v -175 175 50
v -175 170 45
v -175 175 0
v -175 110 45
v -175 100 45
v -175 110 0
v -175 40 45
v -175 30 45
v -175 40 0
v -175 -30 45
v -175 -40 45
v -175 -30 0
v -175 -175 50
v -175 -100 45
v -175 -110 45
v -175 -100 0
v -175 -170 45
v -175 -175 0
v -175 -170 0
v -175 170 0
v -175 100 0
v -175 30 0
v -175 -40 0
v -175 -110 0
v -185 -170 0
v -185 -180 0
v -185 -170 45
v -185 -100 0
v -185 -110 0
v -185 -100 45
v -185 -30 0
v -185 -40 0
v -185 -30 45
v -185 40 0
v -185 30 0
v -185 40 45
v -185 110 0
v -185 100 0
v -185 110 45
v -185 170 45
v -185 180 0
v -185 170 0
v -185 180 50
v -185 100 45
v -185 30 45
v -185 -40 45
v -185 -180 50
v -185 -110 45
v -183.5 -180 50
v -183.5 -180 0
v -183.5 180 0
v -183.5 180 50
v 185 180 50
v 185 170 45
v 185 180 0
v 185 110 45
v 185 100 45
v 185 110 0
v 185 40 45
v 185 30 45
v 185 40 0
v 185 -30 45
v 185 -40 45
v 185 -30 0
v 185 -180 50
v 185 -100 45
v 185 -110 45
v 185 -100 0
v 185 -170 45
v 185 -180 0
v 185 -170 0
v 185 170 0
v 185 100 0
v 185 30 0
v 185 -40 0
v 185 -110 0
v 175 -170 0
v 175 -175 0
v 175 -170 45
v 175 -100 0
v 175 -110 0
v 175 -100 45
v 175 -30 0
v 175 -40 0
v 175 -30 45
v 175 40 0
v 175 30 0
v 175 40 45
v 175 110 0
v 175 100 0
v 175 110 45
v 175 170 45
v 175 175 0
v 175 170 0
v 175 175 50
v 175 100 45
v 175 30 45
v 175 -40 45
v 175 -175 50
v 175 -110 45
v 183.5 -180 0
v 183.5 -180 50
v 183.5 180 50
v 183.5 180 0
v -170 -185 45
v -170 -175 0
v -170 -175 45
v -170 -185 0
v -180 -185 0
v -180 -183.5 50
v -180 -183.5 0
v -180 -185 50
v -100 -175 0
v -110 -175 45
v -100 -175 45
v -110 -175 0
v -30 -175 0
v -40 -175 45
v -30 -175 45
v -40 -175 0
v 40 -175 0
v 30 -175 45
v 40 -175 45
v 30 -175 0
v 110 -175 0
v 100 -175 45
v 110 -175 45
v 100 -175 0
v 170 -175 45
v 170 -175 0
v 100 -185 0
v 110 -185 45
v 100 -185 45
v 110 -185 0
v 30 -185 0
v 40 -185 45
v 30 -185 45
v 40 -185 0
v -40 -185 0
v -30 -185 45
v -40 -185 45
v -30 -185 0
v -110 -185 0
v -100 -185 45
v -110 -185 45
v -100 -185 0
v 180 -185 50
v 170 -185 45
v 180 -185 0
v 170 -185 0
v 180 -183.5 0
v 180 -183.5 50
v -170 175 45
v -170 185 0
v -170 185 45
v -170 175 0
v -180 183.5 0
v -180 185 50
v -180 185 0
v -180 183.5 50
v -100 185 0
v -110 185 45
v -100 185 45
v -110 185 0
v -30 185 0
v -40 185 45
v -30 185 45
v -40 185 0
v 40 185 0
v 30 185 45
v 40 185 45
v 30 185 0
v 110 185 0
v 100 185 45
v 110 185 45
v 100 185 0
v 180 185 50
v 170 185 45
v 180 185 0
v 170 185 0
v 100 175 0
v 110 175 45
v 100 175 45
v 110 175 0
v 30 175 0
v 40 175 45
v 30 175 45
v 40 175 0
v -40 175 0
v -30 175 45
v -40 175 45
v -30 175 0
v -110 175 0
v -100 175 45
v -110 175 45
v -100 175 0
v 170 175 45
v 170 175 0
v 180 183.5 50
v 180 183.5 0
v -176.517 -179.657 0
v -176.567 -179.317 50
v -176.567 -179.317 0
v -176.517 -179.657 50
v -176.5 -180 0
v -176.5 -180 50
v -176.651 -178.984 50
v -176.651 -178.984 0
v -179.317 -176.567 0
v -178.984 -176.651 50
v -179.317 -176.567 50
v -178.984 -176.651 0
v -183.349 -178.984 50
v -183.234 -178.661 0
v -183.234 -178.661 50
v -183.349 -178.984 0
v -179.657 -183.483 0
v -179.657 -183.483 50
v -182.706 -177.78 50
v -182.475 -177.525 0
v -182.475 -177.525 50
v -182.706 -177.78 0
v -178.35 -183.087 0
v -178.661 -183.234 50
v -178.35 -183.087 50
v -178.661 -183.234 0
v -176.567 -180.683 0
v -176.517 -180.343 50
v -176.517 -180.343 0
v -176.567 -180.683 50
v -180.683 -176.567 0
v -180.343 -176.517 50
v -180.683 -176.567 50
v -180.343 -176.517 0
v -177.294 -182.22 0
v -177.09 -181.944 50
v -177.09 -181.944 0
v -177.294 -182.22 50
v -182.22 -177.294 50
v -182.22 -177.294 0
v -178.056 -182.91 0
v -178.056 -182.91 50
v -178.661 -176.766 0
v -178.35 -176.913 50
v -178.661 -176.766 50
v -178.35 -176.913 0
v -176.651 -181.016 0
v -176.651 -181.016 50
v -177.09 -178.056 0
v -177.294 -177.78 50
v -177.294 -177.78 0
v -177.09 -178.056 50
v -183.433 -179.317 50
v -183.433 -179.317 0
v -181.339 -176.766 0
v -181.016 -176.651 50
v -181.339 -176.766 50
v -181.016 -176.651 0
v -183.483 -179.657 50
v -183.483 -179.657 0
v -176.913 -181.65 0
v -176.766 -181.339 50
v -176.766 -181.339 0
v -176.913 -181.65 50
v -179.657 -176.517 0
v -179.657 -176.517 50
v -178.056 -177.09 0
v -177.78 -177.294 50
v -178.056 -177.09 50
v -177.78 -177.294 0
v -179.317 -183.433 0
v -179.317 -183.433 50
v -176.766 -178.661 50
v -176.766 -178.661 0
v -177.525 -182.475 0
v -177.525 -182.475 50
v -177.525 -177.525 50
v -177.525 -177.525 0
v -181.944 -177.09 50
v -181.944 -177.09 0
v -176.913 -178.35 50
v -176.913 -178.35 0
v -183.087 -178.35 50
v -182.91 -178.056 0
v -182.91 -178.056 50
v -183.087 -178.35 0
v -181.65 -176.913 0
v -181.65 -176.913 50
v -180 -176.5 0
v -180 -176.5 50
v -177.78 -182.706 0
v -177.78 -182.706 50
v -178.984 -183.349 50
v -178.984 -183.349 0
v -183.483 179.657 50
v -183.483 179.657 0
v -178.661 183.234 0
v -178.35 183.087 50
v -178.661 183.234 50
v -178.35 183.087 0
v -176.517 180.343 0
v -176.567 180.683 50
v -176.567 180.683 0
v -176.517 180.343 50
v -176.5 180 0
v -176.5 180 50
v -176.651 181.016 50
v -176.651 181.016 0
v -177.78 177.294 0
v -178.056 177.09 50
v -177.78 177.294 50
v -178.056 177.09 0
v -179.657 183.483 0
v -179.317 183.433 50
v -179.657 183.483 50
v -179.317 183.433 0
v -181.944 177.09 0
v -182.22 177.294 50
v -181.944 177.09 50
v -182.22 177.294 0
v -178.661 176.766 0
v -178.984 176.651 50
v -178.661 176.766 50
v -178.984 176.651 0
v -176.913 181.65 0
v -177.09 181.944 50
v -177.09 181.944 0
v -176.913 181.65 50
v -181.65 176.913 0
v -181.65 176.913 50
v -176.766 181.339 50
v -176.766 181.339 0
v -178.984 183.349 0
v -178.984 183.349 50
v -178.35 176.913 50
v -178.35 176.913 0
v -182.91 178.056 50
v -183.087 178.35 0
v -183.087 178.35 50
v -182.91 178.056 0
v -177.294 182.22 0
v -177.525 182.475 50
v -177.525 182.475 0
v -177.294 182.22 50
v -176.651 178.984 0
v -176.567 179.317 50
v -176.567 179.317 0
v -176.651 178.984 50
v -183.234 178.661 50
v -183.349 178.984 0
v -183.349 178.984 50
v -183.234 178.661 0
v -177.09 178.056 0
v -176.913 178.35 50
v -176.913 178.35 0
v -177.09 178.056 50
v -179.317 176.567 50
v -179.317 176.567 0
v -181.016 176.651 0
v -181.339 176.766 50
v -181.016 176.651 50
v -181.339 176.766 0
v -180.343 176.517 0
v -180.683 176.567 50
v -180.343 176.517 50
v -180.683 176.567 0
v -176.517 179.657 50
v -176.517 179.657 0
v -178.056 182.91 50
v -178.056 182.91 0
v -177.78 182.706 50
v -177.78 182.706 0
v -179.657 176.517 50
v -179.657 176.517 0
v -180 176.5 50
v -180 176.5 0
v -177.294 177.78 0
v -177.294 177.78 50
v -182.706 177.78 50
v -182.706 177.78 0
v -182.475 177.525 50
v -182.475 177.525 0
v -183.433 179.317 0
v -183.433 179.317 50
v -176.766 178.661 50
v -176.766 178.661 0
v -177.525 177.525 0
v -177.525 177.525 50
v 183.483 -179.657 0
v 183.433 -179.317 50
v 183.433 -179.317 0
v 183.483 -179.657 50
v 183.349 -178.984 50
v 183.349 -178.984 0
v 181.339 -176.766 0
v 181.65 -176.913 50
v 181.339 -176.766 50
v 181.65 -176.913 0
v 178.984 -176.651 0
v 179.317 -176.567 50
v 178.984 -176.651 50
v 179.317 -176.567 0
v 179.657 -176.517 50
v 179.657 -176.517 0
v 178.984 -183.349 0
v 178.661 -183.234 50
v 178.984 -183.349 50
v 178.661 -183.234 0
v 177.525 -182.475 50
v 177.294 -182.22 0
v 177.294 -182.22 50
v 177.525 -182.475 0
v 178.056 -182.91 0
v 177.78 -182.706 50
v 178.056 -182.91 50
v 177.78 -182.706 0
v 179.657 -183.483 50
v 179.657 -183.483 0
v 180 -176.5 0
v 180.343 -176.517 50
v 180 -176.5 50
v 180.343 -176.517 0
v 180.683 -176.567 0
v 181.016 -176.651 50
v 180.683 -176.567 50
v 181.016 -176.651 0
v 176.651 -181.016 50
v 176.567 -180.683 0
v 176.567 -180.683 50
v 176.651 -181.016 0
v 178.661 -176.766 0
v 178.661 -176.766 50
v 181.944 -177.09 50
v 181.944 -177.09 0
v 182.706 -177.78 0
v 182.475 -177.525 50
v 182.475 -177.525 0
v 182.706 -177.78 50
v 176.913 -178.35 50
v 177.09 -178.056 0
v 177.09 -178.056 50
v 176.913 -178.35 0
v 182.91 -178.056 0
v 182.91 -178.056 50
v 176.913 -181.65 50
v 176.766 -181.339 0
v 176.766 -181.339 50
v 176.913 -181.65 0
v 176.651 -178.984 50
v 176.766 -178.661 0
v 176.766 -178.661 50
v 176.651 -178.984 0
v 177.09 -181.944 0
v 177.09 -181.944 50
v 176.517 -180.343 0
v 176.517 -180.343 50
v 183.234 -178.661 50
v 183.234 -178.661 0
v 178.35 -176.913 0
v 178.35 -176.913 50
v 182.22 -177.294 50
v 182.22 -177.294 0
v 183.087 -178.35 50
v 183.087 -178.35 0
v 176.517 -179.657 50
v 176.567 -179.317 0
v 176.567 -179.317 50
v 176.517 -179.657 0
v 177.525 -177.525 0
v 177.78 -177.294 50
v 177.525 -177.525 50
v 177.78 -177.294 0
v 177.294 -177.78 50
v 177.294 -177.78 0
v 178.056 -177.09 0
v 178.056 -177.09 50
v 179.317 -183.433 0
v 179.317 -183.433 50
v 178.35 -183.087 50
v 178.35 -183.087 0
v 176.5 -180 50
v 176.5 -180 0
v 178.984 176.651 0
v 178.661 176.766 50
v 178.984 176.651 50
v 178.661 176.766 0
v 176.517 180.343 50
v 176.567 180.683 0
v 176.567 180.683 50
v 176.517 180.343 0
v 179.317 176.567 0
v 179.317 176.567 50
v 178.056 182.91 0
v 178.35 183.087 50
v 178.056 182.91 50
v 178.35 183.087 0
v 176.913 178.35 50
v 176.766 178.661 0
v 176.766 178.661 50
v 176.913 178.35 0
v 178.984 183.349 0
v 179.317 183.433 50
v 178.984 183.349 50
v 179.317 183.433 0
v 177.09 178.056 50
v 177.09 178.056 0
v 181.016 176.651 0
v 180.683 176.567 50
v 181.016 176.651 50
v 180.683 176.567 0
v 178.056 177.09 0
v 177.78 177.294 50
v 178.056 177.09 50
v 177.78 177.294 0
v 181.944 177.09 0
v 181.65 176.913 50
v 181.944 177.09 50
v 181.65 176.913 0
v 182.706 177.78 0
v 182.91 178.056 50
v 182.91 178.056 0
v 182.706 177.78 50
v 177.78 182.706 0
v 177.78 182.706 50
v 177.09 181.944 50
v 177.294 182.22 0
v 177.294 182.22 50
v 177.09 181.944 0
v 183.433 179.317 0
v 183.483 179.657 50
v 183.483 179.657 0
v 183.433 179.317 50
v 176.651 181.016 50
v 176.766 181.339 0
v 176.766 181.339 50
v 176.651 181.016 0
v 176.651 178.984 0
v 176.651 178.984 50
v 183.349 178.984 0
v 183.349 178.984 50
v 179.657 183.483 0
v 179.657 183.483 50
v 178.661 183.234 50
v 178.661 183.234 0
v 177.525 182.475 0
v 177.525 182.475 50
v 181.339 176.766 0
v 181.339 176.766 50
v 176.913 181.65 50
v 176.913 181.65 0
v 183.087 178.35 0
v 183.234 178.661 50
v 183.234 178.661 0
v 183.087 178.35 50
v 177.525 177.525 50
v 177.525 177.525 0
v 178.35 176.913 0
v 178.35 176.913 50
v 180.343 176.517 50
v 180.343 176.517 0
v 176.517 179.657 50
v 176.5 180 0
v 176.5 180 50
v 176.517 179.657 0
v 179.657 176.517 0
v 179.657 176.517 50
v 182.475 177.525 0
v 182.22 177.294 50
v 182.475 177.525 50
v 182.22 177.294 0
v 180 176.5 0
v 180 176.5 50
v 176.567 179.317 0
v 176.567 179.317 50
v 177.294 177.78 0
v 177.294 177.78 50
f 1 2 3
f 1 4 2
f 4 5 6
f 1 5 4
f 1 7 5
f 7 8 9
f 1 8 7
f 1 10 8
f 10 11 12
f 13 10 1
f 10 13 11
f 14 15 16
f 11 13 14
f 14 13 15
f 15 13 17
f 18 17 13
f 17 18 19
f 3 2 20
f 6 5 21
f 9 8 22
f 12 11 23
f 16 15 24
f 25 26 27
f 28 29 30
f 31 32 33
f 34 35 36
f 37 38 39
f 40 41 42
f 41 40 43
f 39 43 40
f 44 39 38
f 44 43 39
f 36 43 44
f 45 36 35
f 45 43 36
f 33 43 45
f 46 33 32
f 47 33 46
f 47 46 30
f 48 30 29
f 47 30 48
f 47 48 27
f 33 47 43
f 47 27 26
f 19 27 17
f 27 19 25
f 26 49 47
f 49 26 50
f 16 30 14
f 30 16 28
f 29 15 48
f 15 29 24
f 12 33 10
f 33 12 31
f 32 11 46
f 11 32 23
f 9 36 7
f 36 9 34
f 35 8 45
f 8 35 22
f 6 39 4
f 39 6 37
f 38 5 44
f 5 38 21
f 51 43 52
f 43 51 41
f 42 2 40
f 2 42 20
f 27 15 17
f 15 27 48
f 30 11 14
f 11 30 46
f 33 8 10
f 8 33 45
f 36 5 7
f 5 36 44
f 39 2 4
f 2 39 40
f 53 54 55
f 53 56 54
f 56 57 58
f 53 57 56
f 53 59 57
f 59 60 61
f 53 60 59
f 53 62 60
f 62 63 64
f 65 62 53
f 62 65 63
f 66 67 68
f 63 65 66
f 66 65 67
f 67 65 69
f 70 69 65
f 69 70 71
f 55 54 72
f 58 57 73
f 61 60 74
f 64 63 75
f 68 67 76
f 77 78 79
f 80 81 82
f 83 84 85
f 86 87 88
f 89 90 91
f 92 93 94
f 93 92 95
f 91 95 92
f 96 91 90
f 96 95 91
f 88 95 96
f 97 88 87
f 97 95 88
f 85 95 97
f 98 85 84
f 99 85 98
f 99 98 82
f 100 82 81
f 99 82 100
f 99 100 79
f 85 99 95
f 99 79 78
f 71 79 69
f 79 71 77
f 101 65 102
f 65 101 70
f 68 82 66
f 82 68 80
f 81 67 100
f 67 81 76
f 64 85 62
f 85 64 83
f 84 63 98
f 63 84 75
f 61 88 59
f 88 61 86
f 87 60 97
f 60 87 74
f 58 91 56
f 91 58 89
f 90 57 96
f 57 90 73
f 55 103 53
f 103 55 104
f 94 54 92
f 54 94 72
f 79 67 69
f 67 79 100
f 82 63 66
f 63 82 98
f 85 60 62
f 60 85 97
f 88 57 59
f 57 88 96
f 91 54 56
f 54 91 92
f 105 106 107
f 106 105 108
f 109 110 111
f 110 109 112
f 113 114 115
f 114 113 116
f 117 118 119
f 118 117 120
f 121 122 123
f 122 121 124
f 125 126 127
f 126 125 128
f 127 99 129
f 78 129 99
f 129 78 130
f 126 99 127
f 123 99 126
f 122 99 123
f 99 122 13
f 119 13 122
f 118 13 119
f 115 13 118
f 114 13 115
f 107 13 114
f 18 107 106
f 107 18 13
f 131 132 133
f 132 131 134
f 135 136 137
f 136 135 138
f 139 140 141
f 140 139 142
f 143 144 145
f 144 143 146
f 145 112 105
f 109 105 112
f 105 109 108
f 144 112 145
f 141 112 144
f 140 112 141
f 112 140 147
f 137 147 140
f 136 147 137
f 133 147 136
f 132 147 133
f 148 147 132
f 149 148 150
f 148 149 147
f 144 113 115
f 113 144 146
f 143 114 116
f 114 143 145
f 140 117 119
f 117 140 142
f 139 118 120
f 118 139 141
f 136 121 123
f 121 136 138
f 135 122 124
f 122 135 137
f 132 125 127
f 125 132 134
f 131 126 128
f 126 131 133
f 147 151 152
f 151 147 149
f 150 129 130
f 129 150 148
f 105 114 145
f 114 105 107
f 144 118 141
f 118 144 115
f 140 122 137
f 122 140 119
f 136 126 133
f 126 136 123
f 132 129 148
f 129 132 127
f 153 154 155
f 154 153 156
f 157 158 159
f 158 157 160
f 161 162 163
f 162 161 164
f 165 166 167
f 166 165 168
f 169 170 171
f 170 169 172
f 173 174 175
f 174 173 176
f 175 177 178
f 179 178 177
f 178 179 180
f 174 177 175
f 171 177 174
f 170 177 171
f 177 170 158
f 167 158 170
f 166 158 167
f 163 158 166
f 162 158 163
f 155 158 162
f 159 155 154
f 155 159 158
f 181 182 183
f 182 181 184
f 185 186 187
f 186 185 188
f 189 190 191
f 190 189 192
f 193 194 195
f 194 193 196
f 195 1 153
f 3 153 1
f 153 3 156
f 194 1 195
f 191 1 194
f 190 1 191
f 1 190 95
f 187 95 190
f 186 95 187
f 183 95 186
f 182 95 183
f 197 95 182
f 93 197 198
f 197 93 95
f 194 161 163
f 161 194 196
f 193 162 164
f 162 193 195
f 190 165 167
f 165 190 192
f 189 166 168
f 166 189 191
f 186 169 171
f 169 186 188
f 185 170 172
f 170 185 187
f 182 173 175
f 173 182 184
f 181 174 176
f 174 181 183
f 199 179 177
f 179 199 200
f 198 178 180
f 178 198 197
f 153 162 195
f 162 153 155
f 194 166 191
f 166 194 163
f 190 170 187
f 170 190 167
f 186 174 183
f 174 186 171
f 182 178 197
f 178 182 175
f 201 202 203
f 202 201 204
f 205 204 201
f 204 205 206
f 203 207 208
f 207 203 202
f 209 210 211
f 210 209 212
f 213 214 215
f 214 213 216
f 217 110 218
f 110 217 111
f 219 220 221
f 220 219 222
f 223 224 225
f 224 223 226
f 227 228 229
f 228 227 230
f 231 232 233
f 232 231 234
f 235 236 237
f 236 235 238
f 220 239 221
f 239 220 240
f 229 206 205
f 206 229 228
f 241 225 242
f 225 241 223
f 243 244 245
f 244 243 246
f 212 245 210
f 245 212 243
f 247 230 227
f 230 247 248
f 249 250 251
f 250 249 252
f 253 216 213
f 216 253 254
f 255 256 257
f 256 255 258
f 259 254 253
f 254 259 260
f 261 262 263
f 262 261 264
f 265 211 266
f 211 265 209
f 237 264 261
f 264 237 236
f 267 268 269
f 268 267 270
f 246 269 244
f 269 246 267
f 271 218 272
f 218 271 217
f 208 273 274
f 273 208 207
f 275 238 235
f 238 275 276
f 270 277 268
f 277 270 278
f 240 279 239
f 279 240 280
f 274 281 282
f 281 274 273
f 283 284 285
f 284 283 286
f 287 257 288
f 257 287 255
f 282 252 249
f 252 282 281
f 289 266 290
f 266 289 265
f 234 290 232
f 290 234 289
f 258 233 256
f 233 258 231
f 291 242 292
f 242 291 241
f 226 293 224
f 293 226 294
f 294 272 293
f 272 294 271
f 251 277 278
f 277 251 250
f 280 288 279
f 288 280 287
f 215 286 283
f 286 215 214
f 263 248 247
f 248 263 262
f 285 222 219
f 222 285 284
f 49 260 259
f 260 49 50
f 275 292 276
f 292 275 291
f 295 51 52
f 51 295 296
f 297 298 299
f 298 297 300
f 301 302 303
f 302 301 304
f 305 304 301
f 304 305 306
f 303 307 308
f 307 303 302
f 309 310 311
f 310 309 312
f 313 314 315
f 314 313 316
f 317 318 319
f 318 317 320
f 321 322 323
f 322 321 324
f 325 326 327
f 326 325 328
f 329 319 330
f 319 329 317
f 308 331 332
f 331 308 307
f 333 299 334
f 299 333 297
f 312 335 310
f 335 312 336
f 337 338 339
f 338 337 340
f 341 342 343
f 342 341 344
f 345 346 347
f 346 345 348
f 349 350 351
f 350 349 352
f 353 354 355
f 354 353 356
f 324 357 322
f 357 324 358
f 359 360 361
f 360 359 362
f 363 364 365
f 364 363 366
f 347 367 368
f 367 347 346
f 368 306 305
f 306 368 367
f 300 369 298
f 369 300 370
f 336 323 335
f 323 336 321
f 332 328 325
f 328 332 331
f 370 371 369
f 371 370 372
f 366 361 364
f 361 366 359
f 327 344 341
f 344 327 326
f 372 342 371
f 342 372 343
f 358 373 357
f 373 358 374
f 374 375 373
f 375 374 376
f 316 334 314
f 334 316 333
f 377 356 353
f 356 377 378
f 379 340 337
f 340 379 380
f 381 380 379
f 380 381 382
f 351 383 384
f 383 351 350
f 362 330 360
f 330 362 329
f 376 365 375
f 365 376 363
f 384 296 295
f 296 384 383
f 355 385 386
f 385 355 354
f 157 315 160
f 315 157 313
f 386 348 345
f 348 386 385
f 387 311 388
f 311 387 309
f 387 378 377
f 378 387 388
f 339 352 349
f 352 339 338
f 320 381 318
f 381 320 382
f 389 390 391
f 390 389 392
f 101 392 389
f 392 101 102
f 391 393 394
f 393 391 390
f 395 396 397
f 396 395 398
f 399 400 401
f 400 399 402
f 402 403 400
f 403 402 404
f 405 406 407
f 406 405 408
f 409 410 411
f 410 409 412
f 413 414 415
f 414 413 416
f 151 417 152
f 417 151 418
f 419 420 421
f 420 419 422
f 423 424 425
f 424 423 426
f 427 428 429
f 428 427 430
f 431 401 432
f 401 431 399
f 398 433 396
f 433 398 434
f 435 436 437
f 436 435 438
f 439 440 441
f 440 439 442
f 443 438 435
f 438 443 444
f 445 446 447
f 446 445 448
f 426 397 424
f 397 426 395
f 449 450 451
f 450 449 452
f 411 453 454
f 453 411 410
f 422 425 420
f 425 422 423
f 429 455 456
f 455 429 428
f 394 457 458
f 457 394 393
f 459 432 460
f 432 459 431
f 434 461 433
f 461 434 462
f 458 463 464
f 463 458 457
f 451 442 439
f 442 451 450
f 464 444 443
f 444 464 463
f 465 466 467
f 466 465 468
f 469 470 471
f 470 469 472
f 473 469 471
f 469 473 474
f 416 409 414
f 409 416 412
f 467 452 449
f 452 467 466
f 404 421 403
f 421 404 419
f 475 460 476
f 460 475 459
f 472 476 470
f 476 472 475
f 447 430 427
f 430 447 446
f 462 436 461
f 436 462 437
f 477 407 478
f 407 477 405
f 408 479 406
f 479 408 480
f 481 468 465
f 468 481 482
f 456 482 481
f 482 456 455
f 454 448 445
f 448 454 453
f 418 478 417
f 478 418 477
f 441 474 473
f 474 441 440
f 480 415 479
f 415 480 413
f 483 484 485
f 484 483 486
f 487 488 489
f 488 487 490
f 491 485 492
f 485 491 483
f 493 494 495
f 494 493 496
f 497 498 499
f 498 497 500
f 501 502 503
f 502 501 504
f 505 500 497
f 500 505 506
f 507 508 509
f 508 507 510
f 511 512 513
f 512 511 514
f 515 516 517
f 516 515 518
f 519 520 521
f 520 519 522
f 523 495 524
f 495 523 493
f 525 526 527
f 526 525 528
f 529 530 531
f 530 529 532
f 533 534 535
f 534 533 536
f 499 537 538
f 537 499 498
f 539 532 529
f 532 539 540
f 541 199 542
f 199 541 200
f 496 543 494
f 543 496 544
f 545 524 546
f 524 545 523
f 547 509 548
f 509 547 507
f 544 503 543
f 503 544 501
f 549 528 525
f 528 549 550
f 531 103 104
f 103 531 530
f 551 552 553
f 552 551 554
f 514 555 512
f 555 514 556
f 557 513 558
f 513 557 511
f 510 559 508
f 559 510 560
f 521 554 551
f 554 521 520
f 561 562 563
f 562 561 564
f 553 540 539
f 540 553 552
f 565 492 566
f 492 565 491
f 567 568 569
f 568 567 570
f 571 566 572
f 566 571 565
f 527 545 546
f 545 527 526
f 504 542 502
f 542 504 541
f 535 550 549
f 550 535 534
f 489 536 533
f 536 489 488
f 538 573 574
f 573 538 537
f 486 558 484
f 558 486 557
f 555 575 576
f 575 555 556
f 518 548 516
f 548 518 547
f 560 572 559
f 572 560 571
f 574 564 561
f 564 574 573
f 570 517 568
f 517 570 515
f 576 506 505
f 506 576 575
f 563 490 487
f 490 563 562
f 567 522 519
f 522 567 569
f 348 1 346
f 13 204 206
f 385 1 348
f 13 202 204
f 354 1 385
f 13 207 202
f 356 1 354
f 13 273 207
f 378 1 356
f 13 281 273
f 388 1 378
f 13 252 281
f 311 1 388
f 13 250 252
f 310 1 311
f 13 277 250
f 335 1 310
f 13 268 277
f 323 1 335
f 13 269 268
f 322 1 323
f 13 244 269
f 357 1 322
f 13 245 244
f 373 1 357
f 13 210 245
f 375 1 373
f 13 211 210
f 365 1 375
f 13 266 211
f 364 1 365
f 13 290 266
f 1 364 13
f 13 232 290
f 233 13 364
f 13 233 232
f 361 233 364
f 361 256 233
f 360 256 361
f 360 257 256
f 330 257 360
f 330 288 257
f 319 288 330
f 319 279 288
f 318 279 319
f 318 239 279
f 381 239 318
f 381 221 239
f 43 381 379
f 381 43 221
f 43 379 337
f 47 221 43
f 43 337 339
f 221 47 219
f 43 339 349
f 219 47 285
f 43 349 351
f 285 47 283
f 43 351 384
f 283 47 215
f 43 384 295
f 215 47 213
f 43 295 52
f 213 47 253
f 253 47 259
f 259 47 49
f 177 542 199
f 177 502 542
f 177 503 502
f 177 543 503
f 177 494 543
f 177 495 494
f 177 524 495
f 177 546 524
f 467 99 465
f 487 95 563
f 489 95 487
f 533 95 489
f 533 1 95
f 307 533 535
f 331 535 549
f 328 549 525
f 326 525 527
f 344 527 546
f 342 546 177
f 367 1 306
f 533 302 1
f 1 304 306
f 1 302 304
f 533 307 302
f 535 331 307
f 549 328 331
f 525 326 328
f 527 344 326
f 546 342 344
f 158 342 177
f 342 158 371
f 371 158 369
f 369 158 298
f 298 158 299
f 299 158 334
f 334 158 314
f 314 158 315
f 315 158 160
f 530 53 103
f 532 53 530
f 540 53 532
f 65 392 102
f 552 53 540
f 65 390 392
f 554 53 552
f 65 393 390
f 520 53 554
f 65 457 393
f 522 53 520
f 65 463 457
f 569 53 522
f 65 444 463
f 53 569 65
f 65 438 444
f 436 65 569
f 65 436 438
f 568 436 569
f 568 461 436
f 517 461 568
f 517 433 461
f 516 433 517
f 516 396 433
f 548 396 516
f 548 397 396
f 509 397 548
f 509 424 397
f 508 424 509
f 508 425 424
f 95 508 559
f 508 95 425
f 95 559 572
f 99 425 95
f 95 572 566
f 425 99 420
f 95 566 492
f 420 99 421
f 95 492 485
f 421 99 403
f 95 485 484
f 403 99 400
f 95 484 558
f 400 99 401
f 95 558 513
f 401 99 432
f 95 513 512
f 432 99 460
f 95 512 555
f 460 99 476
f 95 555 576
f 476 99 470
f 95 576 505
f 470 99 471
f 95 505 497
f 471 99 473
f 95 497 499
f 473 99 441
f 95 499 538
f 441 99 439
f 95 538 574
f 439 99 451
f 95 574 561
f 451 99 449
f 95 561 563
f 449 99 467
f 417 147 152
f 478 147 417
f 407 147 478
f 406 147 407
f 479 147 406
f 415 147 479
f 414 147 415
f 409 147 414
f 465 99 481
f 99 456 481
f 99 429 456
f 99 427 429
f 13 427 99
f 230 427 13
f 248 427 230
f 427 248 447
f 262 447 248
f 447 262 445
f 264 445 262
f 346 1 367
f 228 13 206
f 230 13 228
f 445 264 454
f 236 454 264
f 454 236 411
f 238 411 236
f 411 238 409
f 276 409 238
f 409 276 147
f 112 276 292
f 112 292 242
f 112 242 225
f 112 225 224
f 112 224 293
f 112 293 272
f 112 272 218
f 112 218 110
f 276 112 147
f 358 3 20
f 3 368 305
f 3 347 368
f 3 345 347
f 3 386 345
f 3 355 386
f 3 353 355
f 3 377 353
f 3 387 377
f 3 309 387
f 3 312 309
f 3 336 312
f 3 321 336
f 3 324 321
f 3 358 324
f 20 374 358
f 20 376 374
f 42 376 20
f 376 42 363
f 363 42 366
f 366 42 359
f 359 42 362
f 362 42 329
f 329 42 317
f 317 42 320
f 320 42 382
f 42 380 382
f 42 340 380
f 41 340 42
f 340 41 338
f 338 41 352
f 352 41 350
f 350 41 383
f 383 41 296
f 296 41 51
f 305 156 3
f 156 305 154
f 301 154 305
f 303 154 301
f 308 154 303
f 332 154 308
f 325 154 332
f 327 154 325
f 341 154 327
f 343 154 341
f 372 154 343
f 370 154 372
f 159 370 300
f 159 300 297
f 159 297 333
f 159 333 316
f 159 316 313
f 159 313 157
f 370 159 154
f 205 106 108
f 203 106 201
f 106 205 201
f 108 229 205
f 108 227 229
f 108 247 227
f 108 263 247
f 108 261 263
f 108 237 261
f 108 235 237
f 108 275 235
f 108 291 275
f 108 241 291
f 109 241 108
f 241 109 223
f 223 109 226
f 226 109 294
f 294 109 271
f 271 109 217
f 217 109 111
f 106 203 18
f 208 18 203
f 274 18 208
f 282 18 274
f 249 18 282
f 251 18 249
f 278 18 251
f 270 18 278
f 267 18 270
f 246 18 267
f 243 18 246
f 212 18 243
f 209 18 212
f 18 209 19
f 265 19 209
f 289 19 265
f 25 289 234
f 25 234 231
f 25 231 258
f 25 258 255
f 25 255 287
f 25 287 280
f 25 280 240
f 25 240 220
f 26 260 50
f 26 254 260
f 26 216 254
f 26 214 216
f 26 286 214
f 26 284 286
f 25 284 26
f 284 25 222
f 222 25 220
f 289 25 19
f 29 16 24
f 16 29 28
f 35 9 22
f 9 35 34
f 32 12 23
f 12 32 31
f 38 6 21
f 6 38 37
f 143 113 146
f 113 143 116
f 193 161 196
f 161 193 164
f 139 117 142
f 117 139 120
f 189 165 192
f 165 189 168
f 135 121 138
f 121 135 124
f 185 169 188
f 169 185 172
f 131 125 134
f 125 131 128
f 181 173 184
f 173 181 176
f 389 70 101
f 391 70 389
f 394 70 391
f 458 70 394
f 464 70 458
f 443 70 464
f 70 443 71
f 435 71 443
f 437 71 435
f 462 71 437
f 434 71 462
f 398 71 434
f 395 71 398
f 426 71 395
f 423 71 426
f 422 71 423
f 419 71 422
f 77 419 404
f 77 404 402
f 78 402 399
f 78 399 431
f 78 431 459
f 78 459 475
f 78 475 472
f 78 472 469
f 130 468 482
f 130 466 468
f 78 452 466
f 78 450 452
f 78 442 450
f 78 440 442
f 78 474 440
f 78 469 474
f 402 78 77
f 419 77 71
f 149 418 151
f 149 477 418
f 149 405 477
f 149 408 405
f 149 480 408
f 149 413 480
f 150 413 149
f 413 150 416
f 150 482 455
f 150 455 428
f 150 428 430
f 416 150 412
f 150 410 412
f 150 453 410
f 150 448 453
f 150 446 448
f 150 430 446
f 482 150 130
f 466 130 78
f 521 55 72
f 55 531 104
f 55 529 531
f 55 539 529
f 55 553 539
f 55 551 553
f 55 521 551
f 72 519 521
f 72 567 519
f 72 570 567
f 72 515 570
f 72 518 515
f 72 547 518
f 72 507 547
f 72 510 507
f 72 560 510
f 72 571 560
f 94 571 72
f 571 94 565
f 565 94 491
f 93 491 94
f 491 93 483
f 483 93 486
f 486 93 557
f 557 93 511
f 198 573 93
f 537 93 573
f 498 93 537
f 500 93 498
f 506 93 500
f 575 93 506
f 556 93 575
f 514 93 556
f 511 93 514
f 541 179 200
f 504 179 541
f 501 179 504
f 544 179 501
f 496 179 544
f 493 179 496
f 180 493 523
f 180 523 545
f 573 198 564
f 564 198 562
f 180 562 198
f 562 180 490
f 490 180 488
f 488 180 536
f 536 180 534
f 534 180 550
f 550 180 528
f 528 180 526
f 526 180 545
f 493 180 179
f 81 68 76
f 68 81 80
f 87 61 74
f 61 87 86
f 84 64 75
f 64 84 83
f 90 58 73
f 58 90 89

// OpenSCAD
/*
  Cage slice 10 of 15
*/

bar = 10;
half_inner = 175;
gap = 70;
rod_d = 7;
half_outer = half_inner + bar;

function grid_pos(n) = -half_inner + n * gap;

module cage_full() {
  difference() {
    union() {
      // Floor grid at z = -10 .. 0
      for (j = [0:5]) {
        y = grid_pos(j);
        translate([-half_inner, y - bar/2, -bar])
          cube([2*half_inner, bar, bar], center=false);
      }
      for (i = [0:5]) {
        x = grid_pos(i);
        translate([x - bar/2, -half_inner, -bar])
          cube([bar, 2*half_inner, bar], center=false);
      }

      // Roof grid at z = 700 .. 710
      for (j = [0:5]) {
        y = grid_pos(j);
        translate([-half_inner, y - bar/2, 700])
          cube([2*half_inner, bar, bar], center=false);
      }
      for (i = [0:5]) {
        x = grid_pos(i);
        translate([x - bar/2, -half_inner, 700])
          cube([bar, 2*half_inner, bar], center=false);
      }

      // Side walls at x = ±175
      for (side = [-1, 1]) {
        sx = side * half_inner;
        x0 = (side == 1) ? sx : sx - bar;
        for (j = [0:5]) {
          y = grid_pos(j);
          translate([x0, y - bar/2, 0])
            cube([bar, bar, 700], center=false);
        }
        for (k = [0:10]) {
          zc = 0 + k * gap;
          translate([x0, -half_inner, zc - bar/2])
            cube([bar, 2*half_inner, bar], center=false);
        }
      }

      // Front/back walls at y = ±175
      for (side = [-1, 1]) {
        sy = side * half_inner;
        y0 = (side == 1) ? sy : sy - bar;
        for (i = [0:5]) {
          x = grid_pos(i);
          translate([x - bar/2, y0, 0])
            cube([bar, bar, 700], center=false);
        }
        for (k = [0:10]) {
          zc = 0 + k * gap;
          translate([-half_inner, y0, zc - bar/2])
            cube([2*half_inner, bar, bar], center=false);
        }
      }
    }

    for (sx = [-1, 1], sy = [-1, 1]) {
      translate([sx * (half_inner + bar/2),
                 sy * (half_inner + bar/2),
                 -20])
        cylinder(d = rod_d, h = 740, $fn = 64);
    }
  }
}

z_min = 440;
z_max = 490;  // height 50 mm

module slice() {
  intersection() {
    cage_full();
    translate([-half_outer - 5, -half_outer - 5, z_min])
      cube([2*(half_outer + 5), 2*(half_outer + 5), z_max - z_min], center=false);
  }
}

translate([0, 0, -z_min])
  slice();
